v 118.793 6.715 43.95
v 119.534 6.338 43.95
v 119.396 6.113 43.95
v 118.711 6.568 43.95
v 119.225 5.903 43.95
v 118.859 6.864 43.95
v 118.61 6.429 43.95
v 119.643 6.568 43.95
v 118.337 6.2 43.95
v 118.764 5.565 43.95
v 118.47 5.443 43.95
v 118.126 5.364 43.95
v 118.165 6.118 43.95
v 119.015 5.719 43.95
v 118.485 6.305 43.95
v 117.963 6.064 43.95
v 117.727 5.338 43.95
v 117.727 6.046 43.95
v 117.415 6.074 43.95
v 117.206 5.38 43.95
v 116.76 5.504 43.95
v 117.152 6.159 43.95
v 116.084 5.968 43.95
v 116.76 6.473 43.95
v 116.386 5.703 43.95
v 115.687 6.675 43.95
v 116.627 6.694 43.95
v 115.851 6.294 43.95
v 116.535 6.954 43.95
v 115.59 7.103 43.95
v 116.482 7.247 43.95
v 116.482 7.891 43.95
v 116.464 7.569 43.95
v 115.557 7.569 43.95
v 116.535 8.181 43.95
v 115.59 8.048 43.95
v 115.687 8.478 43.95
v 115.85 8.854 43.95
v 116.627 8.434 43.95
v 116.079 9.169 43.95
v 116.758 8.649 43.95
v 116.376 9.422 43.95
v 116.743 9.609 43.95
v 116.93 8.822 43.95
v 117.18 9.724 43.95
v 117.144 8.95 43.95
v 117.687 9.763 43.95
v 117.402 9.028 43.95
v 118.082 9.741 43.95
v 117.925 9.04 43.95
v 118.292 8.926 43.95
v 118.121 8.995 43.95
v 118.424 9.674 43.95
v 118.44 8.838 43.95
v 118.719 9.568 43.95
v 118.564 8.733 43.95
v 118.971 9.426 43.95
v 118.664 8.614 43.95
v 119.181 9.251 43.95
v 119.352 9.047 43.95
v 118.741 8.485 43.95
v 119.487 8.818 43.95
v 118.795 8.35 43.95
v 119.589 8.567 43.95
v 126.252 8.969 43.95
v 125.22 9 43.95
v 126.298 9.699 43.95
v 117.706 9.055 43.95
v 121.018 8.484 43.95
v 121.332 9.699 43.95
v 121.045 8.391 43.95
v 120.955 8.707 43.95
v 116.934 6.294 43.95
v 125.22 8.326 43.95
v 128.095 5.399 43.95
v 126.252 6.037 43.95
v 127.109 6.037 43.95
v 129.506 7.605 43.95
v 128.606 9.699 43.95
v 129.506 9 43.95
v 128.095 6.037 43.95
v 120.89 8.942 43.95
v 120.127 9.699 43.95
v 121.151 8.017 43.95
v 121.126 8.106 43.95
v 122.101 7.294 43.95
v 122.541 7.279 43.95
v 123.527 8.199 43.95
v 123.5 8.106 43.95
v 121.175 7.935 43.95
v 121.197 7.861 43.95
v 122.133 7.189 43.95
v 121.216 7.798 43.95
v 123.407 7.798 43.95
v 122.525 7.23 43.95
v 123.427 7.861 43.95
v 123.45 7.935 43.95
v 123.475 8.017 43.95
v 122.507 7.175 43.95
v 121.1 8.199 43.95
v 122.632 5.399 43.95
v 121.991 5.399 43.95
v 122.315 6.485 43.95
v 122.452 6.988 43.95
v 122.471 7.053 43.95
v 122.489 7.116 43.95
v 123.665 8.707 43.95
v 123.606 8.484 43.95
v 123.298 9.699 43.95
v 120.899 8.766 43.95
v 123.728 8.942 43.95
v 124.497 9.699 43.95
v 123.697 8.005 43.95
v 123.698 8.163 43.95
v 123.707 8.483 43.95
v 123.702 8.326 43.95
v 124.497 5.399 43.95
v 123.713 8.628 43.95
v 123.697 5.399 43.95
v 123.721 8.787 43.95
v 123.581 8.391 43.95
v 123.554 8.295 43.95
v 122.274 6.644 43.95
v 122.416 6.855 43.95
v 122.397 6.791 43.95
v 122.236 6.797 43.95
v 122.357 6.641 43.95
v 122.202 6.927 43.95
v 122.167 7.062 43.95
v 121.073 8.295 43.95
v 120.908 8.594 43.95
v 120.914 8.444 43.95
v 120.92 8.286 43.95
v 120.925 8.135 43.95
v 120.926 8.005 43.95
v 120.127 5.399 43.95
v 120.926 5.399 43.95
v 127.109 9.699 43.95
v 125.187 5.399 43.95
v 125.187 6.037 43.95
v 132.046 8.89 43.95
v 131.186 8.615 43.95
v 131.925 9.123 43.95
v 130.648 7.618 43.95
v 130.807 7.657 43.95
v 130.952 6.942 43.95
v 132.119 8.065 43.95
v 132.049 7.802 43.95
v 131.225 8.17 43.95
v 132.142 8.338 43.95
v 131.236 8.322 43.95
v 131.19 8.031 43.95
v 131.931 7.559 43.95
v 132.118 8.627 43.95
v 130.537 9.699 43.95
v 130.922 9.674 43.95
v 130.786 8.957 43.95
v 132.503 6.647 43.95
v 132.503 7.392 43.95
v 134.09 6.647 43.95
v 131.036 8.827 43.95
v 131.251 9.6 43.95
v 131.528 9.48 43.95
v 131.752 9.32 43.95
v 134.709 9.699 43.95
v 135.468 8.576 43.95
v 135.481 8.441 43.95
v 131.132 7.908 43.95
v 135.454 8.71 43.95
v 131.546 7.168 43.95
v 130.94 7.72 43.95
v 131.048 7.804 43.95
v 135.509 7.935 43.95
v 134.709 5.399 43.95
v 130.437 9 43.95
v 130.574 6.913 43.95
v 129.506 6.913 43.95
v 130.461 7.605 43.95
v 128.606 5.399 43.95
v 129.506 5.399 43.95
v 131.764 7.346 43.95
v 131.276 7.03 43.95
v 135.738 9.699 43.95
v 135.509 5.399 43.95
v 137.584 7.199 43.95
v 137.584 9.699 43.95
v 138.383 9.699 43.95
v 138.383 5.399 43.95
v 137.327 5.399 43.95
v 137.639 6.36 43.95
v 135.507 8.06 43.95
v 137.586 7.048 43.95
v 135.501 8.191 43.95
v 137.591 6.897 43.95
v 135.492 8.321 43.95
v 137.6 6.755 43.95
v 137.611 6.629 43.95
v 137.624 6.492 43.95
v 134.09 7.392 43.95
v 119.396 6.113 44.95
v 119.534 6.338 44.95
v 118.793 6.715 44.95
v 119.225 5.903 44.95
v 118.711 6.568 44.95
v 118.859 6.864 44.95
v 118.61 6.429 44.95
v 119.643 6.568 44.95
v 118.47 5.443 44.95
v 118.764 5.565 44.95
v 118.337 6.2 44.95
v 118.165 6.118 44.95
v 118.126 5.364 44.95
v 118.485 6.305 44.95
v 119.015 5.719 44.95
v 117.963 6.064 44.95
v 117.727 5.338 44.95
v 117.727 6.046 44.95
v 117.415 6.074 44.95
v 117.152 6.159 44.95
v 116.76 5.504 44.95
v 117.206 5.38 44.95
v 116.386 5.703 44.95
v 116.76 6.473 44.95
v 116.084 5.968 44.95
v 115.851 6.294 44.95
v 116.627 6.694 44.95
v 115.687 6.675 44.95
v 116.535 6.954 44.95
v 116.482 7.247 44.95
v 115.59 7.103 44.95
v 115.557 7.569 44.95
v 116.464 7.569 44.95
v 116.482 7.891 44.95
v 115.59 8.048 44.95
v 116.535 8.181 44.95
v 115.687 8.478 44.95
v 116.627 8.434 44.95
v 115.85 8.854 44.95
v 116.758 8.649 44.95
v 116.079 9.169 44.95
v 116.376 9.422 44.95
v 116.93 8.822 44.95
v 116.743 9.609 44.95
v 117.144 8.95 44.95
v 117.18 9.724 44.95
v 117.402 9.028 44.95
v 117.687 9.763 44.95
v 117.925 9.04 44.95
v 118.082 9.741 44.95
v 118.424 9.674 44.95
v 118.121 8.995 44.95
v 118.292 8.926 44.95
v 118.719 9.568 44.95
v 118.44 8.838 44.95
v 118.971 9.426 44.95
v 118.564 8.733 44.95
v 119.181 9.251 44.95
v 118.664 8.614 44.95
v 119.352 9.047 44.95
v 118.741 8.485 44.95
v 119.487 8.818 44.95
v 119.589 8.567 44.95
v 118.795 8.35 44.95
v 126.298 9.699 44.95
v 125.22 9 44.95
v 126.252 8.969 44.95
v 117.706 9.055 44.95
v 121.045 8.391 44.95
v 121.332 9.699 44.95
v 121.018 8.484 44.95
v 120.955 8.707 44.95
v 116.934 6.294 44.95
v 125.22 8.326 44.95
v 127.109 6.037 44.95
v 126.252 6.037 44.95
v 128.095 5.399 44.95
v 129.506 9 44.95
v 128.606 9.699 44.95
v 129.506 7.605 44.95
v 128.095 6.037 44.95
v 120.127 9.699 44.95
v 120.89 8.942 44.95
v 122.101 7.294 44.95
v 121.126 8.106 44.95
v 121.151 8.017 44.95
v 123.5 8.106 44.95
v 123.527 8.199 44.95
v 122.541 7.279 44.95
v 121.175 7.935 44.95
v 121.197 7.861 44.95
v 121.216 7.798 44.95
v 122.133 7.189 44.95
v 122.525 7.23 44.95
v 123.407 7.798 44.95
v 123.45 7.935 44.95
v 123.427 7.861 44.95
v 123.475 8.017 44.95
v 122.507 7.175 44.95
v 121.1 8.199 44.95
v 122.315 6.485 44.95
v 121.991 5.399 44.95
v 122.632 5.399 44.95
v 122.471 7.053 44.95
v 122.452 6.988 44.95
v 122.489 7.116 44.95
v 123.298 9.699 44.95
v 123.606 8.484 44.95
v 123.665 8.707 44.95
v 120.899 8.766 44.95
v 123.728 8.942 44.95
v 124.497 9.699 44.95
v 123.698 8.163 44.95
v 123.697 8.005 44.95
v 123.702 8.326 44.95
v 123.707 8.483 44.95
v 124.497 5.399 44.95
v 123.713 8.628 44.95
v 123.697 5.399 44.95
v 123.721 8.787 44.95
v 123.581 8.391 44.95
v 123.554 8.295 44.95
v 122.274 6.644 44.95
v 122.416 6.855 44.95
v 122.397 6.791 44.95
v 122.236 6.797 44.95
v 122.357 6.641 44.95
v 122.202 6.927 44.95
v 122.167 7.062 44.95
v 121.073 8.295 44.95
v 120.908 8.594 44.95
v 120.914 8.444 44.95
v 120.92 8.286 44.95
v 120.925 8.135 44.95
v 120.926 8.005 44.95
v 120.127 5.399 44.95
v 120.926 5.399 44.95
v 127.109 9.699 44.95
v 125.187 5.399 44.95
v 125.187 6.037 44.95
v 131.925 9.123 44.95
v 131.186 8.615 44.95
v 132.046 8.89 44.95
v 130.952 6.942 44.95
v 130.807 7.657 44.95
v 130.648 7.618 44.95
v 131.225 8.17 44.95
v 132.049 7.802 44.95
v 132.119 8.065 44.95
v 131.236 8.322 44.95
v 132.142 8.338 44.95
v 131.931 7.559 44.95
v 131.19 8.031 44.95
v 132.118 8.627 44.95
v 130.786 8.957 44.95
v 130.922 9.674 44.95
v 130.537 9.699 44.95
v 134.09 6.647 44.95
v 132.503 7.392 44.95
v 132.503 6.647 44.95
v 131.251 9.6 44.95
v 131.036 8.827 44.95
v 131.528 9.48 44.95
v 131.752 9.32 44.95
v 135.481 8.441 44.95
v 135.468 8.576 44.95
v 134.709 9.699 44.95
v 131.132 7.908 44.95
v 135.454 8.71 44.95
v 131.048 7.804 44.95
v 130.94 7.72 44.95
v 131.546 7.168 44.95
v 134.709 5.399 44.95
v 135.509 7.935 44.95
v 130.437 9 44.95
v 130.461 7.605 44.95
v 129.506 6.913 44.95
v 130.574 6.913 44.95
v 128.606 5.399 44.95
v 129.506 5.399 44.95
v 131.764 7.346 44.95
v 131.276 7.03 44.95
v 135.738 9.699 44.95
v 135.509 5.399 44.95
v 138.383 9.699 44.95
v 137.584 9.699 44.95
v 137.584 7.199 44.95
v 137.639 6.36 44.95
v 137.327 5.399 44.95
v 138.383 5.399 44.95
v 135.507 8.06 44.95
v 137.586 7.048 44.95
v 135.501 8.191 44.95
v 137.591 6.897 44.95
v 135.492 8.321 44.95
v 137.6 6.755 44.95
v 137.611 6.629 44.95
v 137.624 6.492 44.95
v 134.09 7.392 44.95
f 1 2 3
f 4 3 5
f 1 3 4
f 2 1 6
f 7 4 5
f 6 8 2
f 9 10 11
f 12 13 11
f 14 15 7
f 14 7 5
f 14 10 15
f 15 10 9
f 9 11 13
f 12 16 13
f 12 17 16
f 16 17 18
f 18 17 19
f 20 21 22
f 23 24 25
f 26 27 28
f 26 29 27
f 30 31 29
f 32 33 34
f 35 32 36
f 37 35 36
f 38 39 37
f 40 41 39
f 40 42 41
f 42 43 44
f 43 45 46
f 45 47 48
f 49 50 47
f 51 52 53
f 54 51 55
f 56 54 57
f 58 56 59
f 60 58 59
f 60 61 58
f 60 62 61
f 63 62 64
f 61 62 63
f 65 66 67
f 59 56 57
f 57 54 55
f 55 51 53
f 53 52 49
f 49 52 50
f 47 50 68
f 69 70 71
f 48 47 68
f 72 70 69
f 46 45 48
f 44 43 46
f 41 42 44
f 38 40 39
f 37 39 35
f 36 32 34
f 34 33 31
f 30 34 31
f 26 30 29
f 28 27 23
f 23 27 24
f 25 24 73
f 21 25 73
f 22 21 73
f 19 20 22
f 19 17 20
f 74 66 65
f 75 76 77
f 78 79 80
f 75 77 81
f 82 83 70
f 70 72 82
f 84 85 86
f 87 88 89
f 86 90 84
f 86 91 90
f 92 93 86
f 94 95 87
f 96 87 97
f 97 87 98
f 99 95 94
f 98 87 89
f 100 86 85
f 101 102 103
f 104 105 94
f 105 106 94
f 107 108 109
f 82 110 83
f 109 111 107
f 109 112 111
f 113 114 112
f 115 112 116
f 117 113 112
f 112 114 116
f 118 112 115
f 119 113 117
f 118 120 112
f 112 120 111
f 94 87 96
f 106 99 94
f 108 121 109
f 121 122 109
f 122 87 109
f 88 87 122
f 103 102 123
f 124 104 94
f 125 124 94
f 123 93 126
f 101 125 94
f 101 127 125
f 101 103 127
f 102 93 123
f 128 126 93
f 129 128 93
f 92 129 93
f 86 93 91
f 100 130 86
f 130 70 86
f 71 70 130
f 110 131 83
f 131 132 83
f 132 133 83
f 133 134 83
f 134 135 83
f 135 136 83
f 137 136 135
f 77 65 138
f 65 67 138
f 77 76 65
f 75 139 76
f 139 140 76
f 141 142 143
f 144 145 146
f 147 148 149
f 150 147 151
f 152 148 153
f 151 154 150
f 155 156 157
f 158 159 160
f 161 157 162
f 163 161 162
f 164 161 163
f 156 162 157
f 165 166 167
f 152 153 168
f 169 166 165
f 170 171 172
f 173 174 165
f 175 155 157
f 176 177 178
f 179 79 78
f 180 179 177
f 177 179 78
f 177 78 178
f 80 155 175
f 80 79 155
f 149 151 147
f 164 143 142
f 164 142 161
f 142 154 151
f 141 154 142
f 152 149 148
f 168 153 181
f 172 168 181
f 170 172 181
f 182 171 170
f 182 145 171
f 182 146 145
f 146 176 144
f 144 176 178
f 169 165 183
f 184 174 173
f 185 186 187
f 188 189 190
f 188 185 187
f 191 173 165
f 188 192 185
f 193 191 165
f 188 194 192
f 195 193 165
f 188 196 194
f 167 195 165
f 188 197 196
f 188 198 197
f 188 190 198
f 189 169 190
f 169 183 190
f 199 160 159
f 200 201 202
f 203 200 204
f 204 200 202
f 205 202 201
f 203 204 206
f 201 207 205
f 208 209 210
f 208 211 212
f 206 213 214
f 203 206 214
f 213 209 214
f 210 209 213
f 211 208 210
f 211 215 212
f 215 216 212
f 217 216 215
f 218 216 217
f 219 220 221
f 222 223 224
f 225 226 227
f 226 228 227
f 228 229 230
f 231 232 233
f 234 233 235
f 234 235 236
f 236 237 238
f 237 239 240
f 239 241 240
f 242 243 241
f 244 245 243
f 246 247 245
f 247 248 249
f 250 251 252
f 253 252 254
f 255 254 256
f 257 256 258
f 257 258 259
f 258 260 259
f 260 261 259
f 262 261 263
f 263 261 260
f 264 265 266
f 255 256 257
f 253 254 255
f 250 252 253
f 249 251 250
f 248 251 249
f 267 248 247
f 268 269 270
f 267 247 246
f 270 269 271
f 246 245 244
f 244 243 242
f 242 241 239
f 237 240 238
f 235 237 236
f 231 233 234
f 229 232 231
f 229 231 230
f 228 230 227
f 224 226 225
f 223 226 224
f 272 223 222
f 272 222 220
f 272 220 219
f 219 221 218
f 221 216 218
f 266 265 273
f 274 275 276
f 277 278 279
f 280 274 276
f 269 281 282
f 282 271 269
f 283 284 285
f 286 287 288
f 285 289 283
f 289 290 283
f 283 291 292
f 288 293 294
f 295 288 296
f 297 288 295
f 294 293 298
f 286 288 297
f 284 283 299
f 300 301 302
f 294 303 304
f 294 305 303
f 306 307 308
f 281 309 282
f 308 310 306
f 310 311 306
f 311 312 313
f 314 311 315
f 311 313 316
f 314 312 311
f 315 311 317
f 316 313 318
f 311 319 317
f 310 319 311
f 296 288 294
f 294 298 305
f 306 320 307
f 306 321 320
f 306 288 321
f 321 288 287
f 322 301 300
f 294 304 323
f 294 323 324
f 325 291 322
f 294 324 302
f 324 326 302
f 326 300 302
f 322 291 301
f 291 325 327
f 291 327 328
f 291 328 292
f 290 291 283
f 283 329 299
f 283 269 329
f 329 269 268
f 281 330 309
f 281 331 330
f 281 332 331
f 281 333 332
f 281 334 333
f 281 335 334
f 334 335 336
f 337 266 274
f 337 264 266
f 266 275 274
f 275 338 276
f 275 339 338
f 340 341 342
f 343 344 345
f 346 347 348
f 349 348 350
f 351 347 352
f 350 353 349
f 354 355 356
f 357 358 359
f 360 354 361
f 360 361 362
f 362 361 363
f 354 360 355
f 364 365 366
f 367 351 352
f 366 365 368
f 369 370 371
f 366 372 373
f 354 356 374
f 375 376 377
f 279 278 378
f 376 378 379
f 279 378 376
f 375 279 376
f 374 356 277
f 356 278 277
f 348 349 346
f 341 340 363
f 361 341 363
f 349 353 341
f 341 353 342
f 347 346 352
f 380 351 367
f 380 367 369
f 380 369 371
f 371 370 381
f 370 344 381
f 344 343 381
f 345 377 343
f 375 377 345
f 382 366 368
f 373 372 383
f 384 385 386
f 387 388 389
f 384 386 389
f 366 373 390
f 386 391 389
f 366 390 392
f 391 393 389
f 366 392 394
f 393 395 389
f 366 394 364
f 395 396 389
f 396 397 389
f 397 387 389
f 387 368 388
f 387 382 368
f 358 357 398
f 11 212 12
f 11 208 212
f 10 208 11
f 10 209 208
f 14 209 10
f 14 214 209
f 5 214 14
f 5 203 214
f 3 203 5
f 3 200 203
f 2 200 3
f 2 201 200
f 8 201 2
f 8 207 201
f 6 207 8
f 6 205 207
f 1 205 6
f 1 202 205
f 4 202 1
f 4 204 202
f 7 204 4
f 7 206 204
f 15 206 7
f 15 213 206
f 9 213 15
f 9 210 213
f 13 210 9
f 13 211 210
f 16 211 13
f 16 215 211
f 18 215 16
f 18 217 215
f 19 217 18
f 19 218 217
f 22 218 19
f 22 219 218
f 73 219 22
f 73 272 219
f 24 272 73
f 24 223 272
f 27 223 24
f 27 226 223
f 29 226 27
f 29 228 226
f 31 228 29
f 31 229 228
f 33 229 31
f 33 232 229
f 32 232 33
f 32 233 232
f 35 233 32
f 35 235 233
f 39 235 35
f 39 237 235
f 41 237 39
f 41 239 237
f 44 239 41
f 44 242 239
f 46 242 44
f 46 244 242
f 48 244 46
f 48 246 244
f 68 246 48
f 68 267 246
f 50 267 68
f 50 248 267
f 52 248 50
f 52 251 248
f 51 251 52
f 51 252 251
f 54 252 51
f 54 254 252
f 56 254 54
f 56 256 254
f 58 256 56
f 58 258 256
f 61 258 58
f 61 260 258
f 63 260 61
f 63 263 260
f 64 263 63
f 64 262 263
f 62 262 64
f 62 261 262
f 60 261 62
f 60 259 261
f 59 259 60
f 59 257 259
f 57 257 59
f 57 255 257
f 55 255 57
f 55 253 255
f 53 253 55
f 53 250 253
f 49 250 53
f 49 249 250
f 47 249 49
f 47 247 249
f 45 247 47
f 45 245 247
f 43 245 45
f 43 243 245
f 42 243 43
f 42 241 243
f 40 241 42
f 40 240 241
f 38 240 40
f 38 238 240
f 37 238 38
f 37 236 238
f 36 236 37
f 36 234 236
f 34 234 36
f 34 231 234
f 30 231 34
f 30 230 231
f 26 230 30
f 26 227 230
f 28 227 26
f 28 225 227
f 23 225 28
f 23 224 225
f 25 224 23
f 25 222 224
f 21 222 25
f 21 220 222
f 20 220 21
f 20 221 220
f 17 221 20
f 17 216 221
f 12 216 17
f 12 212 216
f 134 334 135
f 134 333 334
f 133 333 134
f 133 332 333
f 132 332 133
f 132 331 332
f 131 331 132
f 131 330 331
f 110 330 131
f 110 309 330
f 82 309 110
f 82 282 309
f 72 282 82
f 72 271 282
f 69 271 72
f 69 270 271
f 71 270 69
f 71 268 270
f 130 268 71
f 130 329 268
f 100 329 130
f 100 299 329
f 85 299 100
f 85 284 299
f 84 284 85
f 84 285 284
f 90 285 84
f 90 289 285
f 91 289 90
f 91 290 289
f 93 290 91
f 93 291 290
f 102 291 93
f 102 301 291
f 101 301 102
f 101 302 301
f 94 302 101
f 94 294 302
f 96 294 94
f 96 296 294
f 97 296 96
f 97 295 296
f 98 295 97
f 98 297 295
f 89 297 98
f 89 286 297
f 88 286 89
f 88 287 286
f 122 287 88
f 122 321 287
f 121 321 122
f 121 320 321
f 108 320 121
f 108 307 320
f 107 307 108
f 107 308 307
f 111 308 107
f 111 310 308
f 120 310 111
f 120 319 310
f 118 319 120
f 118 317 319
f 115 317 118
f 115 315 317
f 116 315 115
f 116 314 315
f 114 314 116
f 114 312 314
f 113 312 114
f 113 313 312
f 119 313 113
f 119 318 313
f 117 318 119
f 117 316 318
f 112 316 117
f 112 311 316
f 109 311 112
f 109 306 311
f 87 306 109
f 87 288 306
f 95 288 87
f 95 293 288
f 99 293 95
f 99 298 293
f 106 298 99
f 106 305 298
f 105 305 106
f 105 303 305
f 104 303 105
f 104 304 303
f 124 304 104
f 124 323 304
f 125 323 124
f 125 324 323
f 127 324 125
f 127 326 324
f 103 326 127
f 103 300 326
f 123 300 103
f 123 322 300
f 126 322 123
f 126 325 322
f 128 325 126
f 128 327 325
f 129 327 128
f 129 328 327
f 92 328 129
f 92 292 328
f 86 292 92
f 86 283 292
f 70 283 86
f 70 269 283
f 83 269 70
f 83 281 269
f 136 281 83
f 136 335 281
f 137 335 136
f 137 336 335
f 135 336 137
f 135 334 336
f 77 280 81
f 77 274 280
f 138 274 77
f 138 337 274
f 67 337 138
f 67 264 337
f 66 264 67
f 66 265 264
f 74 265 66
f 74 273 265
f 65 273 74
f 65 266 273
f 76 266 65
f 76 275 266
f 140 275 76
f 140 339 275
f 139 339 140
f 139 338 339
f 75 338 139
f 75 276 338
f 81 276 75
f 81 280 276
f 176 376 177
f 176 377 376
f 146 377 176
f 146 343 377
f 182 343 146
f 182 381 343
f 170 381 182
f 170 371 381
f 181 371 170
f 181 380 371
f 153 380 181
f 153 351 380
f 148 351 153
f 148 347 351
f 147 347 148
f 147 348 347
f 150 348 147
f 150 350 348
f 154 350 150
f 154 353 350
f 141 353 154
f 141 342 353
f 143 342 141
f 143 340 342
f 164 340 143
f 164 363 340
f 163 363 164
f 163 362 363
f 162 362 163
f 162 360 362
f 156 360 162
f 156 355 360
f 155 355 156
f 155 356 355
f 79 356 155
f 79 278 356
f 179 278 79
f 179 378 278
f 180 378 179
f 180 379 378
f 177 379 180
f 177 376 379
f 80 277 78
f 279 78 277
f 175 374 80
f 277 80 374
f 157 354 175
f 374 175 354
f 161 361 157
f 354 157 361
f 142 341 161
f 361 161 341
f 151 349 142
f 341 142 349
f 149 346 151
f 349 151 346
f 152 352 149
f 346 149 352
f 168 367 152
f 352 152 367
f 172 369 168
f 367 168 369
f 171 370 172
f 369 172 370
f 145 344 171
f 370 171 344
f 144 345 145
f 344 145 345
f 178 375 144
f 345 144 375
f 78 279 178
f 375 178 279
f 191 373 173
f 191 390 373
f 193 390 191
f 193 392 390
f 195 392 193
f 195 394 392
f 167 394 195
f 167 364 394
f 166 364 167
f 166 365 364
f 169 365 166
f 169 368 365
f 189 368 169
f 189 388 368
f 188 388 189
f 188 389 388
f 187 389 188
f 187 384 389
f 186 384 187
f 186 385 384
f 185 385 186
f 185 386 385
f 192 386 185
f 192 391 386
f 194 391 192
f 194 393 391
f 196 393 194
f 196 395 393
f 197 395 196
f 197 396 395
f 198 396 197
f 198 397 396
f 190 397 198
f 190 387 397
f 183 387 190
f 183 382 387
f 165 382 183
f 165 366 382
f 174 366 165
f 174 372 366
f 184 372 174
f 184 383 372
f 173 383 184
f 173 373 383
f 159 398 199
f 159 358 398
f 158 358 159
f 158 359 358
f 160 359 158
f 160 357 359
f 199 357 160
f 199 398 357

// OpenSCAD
// CM1P-N ID text, engraved 0.5 into the plate's top face (frame as cm1p_k_freecad.py).
translate([127, 7.5, 43.95]) linear_extrude(1) text("CM1P-N", size = 4.5, font = "Liberation Sans:style=Bold", halign = "center", valign = "center");
